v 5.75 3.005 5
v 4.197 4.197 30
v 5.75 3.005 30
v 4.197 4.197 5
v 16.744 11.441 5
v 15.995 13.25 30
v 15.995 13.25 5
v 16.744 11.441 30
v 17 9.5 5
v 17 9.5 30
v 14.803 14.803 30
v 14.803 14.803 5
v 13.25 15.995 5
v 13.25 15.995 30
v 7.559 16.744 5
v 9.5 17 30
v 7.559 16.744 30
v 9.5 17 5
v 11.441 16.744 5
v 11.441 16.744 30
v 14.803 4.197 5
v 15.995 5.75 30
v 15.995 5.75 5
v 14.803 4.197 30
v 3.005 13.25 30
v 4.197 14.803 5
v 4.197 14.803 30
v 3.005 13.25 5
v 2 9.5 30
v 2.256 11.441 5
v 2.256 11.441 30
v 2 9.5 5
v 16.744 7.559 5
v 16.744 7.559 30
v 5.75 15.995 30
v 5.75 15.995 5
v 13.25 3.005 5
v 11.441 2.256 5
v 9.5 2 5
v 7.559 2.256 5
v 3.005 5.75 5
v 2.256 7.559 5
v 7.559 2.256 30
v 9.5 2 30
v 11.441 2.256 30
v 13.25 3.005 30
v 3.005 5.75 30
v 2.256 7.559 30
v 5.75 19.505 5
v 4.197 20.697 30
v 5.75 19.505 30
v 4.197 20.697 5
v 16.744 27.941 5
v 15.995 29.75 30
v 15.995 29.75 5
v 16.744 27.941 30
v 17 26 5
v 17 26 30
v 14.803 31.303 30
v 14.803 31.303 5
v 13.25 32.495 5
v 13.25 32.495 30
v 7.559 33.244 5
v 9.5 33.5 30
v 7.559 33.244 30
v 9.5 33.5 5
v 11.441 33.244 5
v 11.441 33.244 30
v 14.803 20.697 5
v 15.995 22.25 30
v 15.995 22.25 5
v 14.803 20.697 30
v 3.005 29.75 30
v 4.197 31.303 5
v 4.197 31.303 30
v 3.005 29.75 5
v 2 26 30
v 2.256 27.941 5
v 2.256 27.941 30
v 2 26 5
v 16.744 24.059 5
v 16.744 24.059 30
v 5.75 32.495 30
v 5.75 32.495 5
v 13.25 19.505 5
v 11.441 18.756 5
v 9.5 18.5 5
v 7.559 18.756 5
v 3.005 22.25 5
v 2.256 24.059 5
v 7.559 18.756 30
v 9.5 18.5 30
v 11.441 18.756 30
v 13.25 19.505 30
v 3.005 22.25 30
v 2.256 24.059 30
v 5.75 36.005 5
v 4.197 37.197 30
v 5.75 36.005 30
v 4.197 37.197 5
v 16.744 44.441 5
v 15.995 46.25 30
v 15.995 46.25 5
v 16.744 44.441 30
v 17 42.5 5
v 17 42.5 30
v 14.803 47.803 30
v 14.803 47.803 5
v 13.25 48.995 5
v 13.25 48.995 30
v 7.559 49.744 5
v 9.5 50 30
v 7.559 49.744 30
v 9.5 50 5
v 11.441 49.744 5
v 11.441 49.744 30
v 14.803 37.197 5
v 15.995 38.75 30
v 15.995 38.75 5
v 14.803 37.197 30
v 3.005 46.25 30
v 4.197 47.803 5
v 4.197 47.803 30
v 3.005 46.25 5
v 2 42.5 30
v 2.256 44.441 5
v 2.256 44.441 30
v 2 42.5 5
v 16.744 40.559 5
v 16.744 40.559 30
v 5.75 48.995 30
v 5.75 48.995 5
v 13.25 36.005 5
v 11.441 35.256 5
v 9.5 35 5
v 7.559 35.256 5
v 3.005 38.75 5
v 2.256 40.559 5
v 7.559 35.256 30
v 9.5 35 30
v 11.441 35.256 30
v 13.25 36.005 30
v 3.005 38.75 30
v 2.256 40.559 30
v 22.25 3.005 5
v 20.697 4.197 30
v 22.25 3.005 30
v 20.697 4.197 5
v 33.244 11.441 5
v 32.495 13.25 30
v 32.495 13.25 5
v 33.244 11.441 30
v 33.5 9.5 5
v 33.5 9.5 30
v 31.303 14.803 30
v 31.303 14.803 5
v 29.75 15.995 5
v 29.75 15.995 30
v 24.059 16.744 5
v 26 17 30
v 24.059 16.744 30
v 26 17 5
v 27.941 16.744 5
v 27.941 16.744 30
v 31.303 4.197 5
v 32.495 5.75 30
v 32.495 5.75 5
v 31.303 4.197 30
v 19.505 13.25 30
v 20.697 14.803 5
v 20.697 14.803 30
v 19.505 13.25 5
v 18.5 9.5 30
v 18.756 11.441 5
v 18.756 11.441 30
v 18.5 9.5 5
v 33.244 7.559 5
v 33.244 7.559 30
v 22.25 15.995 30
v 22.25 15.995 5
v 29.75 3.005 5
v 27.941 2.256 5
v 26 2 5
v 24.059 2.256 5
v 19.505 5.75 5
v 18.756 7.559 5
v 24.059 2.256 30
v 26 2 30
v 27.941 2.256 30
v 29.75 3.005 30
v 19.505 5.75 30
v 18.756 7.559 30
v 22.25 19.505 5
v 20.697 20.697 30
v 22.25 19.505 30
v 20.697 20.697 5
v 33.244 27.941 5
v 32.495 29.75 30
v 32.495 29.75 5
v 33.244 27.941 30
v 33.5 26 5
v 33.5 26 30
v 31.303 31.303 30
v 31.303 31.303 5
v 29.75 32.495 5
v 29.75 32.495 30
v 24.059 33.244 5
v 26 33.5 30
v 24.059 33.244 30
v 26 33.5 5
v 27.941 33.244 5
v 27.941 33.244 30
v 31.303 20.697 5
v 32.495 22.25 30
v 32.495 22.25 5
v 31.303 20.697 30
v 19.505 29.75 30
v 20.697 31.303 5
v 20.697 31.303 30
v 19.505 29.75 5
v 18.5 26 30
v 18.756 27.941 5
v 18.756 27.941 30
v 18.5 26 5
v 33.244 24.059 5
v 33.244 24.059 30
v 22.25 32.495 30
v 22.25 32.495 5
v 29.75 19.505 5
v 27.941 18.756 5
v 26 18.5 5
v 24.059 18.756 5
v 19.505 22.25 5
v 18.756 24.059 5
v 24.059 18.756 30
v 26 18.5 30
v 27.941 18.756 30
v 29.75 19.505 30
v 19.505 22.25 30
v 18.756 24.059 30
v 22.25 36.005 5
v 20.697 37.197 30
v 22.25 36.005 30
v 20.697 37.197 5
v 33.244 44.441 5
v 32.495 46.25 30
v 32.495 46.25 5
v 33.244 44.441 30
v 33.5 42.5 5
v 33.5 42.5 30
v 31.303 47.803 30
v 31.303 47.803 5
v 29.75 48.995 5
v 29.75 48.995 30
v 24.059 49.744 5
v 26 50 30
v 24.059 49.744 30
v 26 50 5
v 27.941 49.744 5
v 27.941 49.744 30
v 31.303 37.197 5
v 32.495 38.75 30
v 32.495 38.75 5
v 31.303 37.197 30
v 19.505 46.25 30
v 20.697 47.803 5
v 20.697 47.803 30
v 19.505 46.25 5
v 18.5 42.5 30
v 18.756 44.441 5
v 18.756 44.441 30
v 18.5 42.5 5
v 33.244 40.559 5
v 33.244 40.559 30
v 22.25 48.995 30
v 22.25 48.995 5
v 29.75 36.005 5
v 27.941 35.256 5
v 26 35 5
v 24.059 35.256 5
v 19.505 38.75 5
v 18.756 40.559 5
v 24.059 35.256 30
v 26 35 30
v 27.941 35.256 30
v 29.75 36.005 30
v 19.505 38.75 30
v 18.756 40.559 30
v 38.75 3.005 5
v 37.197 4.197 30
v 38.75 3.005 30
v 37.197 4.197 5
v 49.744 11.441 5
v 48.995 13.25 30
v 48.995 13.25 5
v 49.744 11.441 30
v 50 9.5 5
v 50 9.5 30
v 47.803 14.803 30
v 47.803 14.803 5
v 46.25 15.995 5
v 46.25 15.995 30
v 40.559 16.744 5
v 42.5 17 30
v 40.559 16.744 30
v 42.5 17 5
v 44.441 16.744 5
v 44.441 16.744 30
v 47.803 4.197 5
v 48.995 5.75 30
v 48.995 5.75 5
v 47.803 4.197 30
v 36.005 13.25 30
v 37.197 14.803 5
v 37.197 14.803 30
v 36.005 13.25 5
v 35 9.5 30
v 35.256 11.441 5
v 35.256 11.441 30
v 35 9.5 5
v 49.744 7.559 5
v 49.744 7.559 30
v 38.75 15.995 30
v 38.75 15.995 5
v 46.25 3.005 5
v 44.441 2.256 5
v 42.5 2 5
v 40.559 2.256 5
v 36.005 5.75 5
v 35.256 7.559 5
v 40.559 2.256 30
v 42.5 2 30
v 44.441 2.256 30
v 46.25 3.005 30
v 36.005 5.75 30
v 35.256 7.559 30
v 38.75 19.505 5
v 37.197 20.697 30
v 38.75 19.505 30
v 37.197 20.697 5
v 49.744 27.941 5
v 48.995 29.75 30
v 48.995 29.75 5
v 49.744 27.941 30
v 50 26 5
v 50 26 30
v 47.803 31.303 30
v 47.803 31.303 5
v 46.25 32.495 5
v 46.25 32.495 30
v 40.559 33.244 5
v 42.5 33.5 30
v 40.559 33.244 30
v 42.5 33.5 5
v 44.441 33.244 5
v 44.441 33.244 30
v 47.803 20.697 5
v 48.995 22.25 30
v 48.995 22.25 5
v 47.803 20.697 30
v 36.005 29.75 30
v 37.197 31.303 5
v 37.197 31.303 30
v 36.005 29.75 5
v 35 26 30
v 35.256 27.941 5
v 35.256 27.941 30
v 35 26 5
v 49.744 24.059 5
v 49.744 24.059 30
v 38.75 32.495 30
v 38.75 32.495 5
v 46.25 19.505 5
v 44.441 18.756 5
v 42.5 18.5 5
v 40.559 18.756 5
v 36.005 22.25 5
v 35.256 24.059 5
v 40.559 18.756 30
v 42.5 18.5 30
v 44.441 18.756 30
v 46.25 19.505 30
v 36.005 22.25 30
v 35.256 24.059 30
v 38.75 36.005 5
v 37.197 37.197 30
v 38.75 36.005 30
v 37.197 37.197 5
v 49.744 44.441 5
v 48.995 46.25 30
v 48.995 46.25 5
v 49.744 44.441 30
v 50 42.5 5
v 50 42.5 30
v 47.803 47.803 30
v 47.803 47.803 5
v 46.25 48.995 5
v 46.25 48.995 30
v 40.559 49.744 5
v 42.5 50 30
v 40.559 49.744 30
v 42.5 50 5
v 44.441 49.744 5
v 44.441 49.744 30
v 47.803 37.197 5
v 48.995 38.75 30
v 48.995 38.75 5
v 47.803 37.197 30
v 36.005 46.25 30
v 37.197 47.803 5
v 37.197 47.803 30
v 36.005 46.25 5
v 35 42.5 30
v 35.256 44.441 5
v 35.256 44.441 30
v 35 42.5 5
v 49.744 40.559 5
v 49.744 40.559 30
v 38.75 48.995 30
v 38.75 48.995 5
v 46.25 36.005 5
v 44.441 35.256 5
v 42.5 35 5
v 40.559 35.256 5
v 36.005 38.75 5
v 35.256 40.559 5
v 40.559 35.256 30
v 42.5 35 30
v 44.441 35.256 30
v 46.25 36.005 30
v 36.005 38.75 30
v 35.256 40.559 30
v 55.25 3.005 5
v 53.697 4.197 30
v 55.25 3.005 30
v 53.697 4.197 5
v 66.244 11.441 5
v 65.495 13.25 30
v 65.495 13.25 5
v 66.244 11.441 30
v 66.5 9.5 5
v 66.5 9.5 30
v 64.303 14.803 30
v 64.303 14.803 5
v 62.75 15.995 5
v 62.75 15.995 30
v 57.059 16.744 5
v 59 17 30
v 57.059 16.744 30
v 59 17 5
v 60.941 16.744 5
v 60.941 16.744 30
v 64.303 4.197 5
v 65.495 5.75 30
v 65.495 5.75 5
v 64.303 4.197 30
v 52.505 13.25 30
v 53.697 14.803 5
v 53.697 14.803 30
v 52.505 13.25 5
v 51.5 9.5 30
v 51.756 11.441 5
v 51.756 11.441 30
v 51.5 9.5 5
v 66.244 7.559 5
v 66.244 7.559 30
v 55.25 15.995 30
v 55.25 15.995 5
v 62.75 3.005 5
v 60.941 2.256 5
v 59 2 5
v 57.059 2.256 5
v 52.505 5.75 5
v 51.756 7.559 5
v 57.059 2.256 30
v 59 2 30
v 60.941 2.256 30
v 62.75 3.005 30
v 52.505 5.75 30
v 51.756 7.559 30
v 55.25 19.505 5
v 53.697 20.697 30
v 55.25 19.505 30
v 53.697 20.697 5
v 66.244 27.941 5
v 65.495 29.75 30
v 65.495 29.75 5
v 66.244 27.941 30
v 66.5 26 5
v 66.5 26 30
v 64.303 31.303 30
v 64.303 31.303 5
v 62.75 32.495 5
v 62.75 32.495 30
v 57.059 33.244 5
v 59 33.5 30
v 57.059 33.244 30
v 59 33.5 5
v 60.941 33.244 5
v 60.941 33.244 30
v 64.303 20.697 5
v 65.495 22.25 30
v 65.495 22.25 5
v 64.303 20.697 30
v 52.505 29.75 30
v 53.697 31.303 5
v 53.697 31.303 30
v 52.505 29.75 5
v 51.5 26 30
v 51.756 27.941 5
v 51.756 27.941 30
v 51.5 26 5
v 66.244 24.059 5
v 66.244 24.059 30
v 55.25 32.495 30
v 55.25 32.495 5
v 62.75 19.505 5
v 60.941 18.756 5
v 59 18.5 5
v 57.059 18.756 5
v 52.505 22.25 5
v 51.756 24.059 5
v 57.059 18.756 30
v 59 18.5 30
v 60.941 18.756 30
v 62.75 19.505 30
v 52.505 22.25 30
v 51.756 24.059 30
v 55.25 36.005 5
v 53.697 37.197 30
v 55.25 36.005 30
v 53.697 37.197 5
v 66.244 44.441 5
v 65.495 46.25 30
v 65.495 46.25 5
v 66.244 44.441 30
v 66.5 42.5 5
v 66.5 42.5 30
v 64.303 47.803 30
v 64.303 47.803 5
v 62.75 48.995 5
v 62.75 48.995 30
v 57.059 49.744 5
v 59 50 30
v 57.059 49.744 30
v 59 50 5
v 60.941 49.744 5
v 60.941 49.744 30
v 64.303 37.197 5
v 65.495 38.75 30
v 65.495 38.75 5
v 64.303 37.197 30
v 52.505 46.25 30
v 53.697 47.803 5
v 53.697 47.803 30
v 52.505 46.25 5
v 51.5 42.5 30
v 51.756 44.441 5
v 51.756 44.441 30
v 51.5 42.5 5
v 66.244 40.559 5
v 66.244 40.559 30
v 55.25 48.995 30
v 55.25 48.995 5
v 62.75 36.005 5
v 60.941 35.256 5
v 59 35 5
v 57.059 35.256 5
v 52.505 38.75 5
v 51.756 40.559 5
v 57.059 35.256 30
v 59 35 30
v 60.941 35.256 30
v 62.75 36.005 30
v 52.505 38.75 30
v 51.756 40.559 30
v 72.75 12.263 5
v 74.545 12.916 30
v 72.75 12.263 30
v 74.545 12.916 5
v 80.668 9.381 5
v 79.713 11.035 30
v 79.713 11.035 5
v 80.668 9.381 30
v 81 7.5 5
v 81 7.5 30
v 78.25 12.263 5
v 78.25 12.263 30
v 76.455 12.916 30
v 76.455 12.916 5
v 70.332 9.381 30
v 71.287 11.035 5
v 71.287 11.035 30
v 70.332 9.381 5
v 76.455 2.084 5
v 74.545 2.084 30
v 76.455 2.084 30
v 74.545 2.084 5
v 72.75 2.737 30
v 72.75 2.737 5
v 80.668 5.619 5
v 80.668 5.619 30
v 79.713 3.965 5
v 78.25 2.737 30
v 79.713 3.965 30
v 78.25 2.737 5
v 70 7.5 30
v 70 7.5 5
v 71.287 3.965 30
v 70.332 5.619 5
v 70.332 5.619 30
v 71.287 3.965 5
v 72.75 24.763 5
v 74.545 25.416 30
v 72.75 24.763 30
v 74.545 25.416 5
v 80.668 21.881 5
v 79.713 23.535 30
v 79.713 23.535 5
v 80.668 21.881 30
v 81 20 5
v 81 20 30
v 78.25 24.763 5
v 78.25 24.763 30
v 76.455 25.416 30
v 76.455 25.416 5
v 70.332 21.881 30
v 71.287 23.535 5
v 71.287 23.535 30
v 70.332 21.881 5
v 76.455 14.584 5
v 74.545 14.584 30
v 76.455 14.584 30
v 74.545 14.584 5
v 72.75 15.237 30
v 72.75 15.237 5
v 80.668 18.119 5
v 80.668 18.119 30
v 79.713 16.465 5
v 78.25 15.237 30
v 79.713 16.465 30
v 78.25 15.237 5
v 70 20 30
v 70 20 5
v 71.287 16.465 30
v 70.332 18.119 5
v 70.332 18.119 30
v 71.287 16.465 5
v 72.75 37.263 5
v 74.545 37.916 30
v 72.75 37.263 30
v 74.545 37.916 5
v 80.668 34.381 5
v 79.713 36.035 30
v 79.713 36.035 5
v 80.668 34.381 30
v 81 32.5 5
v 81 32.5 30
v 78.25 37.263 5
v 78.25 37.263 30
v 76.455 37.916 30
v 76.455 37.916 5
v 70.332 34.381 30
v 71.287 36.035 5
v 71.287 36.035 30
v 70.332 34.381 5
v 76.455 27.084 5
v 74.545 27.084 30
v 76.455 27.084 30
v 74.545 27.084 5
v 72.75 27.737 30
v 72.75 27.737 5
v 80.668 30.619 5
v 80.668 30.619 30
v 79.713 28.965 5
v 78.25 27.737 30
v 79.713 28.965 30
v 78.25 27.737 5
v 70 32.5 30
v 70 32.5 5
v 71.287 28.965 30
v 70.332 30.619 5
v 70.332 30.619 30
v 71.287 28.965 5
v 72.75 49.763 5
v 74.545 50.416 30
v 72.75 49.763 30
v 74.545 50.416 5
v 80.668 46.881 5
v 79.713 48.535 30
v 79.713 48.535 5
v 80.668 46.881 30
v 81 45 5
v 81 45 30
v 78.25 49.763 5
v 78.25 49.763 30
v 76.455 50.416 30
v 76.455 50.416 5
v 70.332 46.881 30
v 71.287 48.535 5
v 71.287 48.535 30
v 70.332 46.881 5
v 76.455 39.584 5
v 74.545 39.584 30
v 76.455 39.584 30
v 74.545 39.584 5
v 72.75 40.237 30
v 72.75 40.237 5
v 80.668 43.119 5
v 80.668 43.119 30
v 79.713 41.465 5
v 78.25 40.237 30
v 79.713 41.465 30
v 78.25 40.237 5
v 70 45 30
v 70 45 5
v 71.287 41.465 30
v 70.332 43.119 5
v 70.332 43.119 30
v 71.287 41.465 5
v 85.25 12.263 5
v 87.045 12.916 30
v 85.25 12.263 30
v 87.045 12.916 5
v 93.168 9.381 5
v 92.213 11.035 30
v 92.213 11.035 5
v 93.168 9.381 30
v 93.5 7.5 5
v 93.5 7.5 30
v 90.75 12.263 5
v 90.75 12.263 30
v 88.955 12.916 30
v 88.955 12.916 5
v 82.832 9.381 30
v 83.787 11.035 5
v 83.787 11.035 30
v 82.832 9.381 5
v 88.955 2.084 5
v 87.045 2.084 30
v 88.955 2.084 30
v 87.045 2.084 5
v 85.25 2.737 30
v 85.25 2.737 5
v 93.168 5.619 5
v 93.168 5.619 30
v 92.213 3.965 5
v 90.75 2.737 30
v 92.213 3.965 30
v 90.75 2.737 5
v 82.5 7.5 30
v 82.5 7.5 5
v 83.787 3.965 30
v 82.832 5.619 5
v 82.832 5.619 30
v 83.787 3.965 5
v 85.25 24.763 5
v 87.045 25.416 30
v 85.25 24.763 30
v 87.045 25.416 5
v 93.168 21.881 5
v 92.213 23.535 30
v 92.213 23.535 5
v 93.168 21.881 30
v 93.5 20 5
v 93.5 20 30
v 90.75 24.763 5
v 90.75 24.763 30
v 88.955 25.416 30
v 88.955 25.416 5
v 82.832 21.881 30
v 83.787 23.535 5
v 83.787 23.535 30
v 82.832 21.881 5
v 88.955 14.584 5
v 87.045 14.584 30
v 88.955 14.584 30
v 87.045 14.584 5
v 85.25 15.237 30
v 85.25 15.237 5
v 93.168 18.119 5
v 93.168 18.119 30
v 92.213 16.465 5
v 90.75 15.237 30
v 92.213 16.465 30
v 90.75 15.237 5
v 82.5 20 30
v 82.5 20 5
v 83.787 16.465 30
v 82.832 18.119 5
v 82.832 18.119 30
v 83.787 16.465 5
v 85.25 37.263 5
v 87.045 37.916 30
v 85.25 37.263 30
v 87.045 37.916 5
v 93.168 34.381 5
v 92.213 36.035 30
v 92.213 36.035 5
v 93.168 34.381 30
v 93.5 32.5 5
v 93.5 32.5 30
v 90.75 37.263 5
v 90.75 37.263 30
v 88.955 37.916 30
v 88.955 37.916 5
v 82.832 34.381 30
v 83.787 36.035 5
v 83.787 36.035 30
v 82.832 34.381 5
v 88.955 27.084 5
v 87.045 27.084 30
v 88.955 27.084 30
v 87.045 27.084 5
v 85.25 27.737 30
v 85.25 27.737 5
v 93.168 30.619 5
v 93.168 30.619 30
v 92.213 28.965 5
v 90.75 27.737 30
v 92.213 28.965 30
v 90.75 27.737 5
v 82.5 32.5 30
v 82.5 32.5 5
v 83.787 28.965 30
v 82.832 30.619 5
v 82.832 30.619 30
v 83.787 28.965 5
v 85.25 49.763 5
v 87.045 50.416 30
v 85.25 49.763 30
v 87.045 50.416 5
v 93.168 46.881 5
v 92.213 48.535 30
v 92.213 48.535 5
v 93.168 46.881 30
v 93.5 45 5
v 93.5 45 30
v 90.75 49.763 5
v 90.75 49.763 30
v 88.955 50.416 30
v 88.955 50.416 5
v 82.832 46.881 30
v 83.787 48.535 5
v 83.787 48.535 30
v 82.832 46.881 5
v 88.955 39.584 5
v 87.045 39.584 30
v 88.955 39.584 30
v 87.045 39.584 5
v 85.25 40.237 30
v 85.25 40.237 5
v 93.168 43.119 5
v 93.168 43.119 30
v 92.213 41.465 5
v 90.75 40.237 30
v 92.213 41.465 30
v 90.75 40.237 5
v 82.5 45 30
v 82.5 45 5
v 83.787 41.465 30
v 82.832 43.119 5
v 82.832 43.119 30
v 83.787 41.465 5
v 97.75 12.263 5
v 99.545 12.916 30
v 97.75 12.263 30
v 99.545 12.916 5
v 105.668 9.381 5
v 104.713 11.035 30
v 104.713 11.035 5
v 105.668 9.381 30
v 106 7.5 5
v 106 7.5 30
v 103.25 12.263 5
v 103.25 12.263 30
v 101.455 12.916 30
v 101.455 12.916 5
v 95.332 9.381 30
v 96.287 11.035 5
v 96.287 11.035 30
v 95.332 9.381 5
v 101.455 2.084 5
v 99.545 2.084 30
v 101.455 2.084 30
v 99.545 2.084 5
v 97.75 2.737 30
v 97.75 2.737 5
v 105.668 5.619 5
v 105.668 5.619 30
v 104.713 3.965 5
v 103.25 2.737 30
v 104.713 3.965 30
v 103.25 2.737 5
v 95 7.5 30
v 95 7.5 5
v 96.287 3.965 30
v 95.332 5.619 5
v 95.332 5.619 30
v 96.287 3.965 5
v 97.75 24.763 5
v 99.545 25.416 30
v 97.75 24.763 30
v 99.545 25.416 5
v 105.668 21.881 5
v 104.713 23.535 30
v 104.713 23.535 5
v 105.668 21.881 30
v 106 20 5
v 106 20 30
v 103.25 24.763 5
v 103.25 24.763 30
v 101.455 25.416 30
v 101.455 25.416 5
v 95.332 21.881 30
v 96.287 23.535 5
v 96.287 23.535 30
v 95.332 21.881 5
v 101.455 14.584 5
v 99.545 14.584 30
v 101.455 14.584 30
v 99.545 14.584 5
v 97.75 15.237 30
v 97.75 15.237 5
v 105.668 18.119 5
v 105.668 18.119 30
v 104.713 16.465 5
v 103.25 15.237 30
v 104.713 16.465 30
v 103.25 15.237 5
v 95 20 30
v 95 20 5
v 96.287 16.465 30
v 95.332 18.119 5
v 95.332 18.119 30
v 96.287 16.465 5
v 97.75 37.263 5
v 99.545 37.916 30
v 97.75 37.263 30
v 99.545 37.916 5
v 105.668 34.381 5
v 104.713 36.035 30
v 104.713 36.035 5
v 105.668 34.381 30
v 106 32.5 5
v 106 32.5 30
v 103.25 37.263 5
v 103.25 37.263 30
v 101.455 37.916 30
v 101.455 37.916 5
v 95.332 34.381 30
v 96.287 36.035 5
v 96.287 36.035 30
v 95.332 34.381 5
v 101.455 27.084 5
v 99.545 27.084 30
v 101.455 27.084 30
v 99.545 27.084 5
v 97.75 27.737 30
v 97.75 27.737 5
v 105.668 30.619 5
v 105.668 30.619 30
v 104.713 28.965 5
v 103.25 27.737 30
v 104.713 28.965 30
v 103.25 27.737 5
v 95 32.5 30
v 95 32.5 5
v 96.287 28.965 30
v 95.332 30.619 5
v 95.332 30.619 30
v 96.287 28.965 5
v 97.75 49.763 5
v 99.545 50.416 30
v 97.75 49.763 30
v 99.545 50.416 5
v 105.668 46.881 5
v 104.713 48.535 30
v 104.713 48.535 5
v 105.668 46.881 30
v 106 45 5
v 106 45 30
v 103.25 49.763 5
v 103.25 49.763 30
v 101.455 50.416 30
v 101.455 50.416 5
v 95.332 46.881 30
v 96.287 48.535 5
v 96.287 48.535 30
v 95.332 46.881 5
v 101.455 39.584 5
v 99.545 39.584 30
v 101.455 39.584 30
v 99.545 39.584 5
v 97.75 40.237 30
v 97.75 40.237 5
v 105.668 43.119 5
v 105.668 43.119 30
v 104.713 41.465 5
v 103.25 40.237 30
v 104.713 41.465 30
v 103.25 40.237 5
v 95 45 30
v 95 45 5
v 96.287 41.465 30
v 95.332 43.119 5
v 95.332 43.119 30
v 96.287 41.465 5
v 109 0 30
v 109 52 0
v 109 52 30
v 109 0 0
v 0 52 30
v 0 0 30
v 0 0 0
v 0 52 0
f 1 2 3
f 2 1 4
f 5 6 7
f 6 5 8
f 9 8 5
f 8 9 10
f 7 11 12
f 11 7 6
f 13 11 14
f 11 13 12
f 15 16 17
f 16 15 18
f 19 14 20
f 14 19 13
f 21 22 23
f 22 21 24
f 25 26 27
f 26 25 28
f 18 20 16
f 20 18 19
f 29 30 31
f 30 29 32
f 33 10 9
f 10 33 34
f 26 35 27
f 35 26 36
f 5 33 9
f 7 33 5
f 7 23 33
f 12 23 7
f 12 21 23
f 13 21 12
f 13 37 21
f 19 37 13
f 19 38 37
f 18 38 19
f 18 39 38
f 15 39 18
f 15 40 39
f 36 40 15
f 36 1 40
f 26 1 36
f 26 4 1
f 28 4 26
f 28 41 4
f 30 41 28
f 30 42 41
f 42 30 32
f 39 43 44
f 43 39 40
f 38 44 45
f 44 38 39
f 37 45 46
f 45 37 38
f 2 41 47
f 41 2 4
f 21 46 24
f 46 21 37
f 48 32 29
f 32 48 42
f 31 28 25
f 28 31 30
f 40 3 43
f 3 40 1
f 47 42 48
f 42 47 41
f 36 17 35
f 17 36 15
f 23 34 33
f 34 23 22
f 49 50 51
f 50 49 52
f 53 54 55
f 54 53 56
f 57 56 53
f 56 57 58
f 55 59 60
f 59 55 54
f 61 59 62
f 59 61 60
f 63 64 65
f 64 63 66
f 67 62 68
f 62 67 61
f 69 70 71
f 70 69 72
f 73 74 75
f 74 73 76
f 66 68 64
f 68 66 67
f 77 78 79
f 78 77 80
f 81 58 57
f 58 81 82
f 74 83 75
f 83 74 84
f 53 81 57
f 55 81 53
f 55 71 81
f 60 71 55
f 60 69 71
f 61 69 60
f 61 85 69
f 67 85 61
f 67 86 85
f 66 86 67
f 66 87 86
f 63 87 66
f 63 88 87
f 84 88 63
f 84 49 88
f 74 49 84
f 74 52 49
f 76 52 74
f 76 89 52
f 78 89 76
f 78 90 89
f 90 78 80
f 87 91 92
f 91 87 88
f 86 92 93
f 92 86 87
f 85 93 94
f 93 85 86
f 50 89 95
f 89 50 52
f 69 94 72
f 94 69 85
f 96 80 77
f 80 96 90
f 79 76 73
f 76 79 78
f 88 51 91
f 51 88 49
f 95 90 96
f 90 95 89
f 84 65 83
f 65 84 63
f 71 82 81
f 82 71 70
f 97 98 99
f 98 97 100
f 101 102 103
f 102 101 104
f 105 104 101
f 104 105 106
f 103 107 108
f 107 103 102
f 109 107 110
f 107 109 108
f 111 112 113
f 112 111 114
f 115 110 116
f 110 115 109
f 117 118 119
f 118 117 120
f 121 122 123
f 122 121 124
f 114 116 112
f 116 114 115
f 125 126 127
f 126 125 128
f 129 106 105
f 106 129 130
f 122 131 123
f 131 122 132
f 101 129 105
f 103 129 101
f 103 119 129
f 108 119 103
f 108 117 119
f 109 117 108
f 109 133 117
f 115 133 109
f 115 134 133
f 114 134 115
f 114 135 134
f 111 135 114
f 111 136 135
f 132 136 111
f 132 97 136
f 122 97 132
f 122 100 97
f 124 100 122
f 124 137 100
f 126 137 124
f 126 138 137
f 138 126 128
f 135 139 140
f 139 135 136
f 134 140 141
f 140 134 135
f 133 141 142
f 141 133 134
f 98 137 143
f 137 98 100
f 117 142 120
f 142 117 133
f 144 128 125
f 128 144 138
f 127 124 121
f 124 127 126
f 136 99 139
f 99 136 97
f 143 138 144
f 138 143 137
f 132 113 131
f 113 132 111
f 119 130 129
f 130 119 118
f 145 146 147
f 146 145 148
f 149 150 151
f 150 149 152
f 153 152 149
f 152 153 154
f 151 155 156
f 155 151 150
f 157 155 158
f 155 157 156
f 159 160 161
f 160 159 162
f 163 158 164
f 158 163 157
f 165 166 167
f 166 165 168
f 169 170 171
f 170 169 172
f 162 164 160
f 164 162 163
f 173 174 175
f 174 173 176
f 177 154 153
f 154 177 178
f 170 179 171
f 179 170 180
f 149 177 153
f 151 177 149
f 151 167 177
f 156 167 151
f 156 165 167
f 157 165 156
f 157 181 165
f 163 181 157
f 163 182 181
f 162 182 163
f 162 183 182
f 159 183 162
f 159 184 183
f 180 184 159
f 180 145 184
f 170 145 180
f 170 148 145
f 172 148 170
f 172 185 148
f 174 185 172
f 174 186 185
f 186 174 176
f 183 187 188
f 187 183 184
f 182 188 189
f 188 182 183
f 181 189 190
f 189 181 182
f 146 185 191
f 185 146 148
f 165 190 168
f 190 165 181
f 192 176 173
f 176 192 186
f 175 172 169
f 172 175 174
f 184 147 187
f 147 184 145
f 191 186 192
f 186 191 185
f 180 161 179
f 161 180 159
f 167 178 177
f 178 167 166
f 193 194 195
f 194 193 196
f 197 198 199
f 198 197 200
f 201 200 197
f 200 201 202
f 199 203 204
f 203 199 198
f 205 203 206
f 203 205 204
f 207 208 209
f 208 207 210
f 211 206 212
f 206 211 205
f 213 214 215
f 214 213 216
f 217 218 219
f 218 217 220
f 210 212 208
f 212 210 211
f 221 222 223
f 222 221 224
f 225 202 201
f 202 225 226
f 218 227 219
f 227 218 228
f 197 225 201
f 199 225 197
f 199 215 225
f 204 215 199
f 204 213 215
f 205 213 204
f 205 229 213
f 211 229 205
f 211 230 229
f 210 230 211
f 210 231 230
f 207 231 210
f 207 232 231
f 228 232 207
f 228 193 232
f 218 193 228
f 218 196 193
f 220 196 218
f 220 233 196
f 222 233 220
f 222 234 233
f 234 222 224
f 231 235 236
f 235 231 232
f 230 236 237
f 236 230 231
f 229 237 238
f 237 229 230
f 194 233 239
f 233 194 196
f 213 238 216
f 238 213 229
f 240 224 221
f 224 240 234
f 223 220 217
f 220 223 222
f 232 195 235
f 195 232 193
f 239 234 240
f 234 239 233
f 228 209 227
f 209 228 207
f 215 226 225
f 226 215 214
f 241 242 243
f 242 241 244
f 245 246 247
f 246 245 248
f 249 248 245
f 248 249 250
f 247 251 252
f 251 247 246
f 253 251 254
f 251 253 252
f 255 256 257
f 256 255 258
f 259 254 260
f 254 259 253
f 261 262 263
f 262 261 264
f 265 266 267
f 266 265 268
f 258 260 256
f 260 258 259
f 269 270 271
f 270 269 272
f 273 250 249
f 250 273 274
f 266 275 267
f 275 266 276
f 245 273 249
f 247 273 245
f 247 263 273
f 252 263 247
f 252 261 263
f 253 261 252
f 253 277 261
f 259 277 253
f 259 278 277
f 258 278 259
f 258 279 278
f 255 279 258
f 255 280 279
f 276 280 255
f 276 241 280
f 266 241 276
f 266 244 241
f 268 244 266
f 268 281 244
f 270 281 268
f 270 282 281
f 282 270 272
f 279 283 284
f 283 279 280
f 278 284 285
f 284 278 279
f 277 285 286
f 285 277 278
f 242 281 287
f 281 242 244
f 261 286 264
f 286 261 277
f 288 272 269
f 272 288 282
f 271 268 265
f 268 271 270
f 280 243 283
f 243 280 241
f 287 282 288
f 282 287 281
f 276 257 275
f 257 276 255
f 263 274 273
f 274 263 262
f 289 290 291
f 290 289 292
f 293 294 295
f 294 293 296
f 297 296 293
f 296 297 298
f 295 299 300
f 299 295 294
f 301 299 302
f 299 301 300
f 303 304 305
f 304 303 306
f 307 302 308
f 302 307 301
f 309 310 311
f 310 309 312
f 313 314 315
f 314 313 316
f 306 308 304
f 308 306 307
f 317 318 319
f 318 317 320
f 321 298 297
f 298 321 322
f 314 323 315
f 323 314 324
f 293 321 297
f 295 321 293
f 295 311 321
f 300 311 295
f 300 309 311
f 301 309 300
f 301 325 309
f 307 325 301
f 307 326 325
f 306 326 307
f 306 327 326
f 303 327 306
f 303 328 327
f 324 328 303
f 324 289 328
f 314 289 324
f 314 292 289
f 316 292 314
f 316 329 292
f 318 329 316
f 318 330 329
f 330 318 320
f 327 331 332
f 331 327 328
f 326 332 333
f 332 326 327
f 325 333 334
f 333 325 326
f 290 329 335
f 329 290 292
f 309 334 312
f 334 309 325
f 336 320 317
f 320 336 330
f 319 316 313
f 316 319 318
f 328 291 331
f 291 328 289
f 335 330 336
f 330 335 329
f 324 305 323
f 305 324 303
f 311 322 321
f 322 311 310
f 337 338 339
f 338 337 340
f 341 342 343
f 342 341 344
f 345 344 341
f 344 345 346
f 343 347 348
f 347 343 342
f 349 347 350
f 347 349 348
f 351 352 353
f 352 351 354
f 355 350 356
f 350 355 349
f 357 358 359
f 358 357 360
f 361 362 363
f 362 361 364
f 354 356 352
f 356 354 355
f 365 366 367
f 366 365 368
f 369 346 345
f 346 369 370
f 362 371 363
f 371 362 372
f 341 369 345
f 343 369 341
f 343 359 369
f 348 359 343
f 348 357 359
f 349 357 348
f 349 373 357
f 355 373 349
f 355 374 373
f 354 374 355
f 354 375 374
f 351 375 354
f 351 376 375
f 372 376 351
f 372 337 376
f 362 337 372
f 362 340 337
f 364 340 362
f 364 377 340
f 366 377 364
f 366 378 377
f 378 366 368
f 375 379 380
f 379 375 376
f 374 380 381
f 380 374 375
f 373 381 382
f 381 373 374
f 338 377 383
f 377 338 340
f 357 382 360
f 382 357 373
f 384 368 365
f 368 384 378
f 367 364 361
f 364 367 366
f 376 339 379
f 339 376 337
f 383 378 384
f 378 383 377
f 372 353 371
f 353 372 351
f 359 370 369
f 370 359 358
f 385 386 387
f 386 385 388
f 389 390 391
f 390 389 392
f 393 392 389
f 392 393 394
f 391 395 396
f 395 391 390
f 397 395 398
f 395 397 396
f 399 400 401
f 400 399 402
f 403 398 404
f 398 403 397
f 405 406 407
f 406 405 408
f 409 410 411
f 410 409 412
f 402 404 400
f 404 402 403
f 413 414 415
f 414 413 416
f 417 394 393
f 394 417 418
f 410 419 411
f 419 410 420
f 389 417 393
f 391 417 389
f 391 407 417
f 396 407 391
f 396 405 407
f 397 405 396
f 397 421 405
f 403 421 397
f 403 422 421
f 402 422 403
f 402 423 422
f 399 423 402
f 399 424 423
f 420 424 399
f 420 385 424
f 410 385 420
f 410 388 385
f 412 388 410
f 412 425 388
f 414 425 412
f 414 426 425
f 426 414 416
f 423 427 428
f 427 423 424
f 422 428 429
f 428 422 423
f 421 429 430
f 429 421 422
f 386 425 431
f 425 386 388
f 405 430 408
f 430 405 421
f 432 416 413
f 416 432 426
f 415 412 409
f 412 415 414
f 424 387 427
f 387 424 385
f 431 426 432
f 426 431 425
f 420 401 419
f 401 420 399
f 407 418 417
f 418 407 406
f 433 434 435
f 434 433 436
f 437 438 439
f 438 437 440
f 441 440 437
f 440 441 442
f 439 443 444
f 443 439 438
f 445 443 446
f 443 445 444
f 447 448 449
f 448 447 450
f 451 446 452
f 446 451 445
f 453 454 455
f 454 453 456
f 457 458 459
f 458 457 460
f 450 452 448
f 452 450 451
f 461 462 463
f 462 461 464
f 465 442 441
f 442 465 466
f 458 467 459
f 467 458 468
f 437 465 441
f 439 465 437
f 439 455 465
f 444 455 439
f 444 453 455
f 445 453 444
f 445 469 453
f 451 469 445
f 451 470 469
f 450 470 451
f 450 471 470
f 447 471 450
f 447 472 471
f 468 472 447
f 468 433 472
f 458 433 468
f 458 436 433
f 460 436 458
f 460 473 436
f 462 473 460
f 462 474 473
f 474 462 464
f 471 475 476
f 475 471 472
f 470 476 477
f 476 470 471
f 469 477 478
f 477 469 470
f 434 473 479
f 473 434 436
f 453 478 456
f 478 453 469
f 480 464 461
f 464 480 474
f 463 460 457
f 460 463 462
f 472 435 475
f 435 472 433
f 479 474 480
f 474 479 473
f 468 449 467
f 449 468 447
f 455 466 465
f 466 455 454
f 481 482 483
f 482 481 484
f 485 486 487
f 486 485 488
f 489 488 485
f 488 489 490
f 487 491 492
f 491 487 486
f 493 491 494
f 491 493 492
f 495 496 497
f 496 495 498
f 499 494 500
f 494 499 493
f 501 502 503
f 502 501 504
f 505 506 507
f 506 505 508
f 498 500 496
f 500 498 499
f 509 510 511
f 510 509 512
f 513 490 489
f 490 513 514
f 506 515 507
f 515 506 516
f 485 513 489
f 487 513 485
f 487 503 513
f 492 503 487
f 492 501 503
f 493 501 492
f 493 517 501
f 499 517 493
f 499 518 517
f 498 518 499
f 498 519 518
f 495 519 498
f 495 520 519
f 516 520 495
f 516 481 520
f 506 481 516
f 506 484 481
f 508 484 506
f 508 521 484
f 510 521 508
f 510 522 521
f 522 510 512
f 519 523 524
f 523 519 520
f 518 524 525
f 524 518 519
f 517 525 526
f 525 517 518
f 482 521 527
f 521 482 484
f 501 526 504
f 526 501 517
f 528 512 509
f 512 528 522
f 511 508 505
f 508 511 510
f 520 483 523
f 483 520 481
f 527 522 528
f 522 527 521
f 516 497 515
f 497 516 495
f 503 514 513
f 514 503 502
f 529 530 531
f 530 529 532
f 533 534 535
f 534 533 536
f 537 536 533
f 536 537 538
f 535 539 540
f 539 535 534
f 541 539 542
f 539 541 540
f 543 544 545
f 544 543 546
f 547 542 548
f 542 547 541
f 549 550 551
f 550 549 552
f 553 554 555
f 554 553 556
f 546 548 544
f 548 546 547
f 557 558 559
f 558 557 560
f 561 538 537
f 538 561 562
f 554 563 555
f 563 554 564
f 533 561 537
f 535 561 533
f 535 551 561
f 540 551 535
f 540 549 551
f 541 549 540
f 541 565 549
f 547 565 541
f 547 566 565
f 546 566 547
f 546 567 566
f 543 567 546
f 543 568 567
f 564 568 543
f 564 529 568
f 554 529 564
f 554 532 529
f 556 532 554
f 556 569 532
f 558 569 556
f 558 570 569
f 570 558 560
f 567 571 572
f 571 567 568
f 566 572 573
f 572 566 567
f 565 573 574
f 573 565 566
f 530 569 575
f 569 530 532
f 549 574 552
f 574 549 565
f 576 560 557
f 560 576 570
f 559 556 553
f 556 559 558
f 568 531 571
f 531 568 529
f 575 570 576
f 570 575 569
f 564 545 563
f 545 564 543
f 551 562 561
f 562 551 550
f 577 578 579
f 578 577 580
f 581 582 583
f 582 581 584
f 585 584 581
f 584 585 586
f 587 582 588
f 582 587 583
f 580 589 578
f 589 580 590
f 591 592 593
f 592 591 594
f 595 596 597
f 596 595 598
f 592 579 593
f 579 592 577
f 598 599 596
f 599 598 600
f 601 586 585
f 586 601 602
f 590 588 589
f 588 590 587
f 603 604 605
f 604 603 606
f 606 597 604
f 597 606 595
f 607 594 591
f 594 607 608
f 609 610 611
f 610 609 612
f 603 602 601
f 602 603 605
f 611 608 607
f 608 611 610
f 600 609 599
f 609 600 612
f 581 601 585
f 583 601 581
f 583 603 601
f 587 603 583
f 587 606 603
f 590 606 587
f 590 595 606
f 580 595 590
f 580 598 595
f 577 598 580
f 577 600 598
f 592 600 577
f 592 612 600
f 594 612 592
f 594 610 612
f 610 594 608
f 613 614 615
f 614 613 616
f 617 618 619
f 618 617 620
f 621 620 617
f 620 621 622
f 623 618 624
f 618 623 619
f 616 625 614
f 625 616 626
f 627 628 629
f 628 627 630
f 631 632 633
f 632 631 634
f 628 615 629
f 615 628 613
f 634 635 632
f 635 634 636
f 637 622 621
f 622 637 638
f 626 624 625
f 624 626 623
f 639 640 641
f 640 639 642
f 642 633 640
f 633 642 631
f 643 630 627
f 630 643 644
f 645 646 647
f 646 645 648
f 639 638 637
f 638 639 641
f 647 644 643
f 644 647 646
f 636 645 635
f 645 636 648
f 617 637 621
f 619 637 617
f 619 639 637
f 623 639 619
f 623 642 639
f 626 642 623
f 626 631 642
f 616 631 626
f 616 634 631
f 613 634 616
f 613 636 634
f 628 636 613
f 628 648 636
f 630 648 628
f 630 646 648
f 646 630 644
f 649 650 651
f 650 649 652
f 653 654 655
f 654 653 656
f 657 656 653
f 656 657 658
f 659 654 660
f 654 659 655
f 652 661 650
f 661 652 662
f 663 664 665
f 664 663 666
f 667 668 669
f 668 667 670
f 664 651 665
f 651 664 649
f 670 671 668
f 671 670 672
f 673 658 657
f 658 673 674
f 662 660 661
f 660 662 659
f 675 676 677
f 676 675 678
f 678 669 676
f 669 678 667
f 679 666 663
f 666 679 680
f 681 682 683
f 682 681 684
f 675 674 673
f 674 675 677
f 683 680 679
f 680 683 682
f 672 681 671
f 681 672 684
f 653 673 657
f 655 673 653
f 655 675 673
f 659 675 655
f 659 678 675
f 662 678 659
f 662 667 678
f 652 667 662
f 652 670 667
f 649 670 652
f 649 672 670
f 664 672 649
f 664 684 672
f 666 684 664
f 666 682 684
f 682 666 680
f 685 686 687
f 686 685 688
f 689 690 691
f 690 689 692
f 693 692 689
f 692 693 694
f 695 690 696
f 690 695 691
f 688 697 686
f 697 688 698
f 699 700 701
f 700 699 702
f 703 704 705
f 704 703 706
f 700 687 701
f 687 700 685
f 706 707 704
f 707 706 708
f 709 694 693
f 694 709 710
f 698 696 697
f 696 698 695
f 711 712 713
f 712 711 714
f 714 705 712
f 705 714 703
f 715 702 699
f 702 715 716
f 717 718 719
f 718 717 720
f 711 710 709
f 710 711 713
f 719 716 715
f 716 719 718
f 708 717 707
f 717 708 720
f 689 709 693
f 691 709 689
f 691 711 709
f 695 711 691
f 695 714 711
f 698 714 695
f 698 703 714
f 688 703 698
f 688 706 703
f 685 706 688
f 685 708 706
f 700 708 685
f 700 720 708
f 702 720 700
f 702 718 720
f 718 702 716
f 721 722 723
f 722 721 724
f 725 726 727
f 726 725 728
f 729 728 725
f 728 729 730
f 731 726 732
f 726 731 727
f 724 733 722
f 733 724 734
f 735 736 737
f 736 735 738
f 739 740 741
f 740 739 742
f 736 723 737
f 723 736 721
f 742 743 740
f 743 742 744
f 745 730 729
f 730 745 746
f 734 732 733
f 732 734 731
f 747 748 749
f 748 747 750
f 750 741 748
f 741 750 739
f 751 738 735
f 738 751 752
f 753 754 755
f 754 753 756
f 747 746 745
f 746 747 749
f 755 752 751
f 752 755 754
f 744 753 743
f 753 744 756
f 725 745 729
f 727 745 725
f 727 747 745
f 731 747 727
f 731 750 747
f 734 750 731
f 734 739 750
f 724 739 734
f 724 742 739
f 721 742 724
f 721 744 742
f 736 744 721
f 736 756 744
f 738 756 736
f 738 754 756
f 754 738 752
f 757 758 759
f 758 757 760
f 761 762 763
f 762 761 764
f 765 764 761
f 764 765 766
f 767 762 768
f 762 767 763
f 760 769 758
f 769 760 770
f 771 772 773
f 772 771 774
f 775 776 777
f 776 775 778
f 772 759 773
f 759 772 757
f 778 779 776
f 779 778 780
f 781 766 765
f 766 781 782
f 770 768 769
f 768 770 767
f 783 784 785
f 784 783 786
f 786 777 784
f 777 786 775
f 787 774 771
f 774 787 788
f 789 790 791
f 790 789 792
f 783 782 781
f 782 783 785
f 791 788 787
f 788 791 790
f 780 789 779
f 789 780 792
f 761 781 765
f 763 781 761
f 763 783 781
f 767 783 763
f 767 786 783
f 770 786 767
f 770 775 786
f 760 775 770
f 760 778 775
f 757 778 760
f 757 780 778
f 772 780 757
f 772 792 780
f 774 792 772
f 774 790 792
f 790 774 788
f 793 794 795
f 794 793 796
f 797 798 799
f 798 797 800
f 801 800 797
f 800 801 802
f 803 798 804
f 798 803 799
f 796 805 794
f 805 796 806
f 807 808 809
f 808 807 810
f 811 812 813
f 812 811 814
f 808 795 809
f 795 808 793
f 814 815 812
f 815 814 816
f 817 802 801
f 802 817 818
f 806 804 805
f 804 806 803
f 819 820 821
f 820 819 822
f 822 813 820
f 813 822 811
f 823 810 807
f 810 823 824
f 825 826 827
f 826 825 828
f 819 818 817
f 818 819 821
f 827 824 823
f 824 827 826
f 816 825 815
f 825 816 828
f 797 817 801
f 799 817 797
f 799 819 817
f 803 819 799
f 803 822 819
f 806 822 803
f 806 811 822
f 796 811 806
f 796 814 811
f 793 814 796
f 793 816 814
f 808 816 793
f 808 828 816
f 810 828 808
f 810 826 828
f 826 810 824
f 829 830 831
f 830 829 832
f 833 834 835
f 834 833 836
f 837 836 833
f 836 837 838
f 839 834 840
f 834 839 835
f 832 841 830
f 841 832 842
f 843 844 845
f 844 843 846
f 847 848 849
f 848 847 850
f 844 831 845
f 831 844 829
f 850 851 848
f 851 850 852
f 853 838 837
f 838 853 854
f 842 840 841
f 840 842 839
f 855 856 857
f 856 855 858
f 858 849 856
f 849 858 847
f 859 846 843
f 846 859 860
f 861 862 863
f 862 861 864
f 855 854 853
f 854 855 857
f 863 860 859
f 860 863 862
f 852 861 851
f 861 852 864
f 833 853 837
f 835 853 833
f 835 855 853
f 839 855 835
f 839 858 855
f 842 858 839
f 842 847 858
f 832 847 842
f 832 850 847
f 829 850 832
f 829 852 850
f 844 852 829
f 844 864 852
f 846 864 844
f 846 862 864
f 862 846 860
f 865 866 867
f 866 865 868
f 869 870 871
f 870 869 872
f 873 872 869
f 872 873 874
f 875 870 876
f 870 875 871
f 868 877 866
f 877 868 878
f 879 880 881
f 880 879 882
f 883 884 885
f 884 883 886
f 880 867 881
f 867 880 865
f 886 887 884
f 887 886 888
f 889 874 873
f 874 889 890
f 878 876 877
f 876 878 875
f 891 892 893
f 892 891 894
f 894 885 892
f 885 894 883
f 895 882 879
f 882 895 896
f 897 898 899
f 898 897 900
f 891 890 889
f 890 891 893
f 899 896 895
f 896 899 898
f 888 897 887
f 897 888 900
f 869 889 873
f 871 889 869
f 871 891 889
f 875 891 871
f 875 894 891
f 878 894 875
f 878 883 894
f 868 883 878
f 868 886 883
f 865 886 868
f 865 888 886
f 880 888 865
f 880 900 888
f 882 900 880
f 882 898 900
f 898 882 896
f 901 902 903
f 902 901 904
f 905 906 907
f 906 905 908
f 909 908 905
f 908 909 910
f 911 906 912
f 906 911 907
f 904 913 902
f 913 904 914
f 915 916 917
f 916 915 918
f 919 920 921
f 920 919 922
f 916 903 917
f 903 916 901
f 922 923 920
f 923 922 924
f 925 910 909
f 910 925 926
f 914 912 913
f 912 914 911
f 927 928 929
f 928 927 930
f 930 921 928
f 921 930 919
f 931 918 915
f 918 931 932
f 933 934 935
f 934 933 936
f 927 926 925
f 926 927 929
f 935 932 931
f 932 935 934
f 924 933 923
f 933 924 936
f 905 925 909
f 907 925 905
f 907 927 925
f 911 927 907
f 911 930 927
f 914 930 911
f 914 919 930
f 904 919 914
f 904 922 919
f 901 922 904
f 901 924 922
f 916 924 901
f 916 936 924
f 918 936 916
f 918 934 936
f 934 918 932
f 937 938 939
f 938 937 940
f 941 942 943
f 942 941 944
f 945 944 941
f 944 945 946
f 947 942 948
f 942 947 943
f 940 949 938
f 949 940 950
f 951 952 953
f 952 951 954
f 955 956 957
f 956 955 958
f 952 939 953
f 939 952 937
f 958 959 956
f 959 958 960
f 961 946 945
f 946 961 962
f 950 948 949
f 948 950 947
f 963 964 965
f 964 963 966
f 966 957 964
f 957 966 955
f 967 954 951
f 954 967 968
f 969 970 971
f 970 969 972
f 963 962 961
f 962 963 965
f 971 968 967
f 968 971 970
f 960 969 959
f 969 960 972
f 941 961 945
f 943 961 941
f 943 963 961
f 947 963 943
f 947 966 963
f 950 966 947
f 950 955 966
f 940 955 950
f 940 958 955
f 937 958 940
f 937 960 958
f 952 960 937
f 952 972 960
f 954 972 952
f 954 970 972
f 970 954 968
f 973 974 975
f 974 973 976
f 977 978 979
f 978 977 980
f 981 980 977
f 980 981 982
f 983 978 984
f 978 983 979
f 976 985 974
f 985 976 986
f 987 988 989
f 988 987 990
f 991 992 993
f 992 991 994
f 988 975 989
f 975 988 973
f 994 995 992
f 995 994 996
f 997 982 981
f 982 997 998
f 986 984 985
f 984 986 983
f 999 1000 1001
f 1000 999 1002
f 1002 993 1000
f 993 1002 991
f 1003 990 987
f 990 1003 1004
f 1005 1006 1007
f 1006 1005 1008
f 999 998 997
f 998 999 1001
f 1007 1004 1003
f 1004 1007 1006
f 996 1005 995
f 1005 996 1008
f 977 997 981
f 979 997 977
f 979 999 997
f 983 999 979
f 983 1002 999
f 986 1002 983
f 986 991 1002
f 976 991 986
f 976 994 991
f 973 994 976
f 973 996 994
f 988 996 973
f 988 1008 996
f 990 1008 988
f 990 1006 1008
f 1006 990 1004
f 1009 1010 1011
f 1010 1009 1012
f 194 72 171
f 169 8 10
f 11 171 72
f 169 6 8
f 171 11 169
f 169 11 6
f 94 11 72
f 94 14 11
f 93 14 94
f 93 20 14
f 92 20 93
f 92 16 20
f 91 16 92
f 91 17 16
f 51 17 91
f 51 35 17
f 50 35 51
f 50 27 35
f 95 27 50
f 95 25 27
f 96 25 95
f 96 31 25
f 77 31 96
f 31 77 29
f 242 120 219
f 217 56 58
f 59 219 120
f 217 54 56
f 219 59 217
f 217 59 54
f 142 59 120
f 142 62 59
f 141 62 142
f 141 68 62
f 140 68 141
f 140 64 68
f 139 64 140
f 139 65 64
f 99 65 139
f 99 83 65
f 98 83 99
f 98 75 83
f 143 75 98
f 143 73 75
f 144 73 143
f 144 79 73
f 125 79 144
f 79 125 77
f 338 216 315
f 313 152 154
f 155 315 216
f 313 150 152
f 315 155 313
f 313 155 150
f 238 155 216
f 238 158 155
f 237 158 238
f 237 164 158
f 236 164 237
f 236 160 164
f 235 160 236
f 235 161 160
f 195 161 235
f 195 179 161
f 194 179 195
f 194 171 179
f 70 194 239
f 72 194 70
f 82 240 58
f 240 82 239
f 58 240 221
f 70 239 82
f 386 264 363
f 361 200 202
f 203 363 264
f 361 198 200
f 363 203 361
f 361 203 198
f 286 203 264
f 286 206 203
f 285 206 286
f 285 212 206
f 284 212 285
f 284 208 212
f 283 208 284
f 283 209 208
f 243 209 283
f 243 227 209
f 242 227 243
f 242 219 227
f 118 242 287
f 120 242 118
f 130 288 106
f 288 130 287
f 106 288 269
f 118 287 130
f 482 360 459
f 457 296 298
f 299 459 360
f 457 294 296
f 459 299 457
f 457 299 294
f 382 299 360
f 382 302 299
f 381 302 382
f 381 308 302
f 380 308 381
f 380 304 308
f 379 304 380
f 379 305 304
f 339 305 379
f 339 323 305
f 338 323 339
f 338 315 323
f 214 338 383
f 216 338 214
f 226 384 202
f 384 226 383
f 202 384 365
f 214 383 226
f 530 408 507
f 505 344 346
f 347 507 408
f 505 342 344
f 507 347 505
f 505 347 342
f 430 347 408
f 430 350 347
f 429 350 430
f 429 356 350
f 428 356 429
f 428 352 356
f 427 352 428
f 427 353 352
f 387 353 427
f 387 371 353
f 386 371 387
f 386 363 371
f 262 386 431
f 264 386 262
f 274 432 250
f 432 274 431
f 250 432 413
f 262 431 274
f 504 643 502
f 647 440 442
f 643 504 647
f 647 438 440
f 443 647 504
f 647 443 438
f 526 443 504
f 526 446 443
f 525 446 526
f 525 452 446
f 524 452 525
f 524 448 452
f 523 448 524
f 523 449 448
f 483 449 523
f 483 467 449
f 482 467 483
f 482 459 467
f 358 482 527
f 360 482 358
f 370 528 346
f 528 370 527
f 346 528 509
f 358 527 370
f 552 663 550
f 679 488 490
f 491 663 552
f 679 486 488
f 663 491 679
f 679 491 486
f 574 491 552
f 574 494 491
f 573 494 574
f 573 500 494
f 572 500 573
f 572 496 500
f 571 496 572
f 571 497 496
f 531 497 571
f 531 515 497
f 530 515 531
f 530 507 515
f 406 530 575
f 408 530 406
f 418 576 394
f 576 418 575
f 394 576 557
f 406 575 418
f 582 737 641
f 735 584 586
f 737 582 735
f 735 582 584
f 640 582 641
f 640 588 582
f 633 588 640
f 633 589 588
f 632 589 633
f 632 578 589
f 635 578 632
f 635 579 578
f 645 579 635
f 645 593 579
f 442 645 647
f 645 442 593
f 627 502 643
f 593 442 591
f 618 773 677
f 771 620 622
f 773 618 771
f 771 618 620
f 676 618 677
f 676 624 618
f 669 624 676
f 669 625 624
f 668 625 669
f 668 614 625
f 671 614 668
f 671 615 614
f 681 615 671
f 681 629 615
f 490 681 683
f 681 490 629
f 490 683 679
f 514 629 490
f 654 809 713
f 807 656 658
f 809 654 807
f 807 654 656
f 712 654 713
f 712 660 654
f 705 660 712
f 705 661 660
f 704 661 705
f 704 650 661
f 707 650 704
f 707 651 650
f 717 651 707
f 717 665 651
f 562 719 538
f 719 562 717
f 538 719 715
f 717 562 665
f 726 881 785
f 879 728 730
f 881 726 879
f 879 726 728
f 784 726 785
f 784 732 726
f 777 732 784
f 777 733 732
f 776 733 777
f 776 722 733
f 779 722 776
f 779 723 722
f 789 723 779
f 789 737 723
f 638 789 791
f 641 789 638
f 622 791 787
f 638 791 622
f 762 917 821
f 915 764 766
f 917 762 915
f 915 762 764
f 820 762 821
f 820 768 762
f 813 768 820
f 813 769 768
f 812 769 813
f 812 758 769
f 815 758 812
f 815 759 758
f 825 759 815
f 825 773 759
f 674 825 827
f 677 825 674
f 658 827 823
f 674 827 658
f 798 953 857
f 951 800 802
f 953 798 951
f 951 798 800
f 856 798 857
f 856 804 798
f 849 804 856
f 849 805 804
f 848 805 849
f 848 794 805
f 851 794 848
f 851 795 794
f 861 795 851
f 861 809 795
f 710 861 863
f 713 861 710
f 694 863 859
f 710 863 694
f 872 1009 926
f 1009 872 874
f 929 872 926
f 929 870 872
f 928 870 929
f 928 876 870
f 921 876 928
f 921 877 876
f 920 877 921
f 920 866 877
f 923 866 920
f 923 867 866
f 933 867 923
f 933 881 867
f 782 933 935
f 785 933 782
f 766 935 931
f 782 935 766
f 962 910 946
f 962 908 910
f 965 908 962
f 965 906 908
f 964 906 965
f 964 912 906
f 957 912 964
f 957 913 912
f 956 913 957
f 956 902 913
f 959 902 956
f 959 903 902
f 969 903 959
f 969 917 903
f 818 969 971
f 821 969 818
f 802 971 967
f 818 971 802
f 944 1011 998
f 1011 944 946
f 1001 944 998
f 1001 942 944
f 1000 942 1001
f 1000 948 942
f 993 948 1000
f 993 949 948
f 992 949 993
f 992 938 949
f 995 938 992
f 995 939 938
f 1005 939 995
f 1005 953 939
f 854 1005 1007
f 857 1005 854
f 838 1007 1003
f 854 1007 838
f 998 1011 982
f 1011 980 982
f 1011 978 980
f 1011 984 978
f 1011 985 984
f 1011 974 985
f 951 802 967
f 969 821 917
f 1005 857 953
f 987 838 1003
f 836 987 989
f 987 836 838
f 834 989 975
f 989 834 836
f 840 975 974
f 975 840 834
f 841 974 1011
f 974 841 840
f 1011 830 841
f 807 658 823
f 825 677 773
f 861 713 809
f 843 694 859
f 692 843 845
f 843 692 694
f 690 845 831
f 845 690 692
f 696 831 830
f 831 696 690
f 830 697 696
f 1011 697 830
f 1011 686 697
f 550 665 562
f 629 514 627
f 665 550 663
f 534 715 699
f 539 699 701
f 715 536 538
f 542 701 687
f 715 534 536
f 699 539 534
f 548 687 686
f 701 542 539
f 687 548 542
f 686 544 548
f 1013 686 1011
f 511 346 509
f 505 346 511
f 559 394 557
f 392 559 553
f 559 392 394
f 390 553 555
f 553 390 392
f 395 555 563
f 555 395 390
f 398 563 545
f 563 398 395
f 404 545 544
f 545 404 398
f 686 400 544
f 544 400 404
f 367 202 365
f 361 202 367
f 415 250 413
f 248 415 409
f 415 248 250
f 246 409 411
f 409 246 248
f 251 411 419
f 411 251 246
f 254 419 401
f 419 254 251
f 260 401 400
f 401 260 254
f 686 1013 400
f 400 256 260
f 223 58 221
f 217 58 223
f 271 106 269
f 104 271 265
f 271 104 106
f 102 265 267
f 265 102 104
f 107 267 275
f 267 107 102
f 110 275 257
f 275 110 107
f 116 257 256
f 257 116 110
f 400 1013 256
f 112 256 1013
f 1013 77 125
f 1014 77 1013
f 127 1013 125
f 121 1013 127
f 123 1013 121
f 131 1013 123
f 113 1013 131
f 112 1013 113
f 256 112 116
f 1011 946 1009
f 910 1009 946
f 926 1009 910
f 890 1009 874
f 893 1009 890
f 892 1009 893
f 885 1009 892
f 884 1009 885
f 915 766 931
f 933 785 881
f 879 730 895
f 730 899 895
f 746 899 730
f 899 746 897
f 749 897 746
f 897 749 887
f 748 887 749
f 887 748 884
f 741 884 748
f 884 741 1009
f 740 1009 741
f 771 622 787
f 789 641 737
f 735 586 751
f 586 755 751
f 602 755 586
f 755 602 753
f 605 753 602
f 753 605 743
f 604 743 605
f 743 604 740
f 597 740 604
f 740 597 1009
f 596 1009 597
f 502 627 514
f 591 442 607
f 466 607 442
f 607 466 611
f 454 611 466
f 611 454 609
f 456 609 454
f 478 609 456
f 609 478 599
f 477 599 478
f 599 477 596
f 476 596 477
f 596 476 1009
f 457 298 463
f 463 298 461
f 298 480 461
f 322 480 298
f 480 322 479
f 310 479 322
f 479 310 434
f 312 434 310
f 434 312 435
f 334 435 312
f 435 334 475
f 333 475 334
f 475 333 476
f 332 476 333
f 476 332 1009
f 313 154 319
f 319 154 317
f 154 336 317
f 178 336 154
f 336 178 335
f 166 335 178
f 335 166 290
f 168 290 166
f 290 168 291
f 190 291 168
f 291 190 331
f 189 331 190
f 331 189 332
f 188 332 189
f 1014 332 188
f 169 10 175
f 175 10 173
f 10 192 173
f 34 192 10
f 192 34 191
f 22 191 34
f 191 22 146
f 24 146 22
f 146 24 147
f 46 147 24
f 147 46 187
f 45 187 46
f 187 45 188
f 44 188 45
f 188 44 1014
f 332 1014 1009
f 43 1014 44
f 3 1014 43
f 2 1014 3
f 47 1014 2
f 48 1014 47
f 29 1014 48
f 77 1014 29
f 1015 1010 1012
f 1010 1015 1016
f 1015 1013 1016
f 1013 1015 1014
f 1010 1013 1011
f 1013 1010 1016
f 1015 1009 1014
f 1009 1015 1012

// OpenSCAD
delta = 0.5;
wall = 2;
AA_r = 14.5/2;
AAA_r = 10.5/2;
h = 30;
base = 5;

n_AA_v = 4;
n_AA_h = 3;
n_AAA_v = 3;
n_AAA_h = 4;

module bat_holes(n_x, n_y, r)
{
    step = r*2 + wall;
    start = r + delta/2 + wall;
    
    for (x = [start : step : step * n_x + wall*2])
        for (y = [start: step: step * n_y + wall*2])
            translate([x, y, base])
                cylinder(r = r + delta/2, h = h);
}

module base()
{
    hole_d_AA = AA_r*2 + delta;
    hole_d_AAA = AAA_r*2 + delta;
    
    AA_sect_len = n_AA_v * hole_d_AA + wall * n_AA_v;
    AAA_sect_len = n_AAA_v * hole_d_AAA + wall * n_AAA_v;
    v_len = AA_sect_len + AAA_sect_len + wall;
    
    h_len_AA = n_AA_h * hole_d_AA + n_AA_h * wall;
    h_len_AAA = n_AAA_h * hole_d_AAA + n_AAA_h * wall;
    h_len = (h_len_AAA > h_len_AA)? h_len_AAA : h_len_AA;
        
    difference()
    {
        cube([v_len, h_len, h]);
        
        bat_holes(n_AA_v, n_AA_h, AA_r);
        
        translate([AA_sect_len, 0, 0])
            bat_holes(n_AAA_v, n_AAA_h, AAA_r);
    }   
}

base();
